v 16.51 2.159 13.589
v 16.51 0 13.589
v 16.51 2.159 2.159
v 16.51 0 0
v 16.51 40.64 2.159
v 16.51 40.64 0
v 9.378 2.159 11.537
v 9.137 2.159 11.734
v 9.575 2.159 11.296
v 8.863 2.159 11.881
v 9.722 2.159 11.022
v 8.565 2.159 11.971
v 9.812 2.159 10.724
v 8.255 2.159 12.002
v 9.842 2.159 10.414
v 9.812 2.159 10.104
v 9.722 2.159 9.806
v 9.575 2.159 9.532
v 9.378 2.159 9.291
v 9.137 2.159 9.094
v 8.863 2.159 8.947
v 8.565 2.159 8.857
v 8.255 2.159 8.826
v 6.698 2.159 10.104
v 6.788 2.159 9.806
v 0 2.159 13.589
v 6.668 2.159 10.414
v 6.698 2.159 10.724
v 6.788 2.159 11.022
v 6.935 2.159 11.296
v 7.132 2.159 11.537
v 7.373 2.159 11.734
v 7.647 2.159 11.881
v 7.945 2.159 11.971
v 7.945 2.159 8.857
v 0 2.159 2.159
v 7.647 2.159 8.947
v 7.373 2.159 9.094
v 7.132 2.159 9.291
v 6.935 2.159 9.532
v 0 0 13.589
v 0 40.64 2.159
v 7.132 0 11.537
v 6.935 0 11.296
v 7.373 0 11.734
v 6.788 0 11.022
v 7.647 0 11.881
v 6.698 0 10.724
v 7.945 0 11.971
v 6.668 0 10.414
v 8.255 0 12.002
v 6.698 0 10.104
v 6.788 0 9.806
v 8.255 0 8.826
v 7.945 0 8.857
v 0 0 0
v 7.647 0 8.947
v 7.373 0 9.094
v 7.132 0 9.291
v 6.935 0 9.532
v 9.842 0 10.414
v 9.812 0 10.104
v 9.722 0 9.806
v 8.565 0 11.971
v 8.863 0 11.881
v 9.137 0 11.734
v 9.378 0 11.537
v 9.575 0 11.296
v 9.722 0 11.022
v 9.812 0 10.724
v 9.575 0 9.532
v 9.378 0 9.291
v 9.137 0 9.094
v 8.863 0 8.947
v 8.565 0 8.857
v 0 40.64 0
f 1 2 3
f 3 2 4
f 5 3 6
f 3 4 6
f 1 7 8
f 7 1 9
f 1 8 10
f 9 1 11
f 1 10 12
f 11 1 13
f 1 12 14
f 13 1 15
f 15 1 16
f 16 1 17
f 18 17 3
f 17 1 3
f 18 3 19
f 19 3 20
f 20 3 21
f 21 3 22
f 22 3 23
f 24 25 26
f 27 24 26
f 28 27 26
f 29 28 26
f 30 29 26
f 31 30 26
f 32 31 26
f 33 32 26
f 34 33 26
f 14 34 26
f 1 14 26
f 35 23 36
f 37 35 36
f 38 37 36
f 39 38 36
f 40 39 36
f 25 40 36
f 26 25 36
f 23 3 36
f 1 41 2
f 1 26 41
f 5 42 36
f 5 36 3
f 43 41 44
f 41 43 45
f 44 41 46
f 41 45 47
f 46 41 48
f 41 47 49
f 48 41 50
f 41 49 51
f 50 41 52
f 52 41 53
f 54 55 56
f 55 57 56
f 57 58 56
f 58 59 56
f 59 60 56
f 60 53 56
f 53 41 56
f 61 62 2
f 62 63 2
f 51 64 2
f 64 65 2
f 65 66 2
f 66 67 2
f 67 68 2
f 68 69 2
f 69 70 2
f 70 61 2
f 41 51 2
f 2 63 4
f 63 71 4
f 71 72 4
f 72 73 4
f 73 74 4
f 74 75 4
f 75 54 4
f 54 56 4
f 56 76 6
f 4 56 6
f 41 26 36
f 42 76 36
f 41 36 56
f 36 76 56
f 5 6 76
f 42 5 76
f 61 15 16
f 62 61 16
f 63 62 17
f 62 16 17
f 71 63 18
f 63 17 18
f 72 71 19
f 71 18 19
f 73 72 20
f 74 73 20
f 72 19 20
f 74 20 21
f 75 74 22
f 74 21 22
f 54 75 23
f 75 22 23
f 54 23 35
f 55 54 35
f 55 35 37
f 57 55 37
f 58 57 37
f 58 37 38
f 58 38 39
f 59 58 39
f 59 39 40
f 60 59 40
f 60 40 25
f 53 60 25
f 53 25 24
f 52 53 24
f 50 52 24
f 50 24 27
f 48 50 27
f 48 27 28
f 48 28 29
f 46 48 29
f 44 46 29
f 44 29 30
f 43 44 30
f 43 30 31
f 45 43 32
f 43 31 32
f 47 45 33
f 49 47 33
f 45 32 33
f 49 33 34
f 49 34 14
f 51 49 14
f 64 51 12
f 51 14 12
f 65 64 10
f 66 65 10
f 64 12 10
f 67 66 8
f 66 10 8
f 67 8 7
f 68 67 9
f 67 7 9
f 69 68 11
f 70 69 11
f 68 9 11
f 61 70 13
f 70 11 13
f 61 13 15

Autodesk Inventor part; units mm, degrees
ref_plane "YZ Plane" through (0, 0, 0) normal (1, 0, 0) x (0, 1, 0)
ref_plane "XZ Plane" through (0, 0, 0) normal (0, 1, 0) x (-1, 0, 0)
ref_plane "XY Plane" through (0, 0, 0) normal (0, 0, 1) x (1, 0, 0)
sketch "Sketch1" plane through (0, 0, 0) normal (0, 0, 1) x (1, 0, 0)
  line L0 (0, 0) -> (16.51, 0)
  line L1 (16.51, 0) -> (16.51, 40.64)
  line L2 (16.51, 40.64) -> (0, 40.64)
  line L3 (0, 40.64) -> (0, 0)
  dimension "d0" = 40.64
  dimension "d1" = 16.51
extrude "Extrusion1" add sketch "Sketch1" along normal blind 2.159
sketch "Sketch2" plane through (0, 0, 2.159) normal (0, 0, 1) x (1, 0, 0)
  line L0 (0, 0) -> (16.51, 0) projected
  line L1 (16.51, 0) -> (16.51, 40.64) projected
  line L2 (0, 0) -> (16.51, 0)
  line L3 (16.51, 0) -> (16.51, 2.159)
  line L4 (16.51, 2.159) -> (0, 2.159)
  line L5 (0, 2.159) -> (0, 0)
  dimension "d4" = 2.159
extrude "Extrusion2" add sketch "Sketch2" along normal blind 11.43
sketch "Sketch3" plane through (0, 2.159, 2.159) normal (0, 1, 0) x (1, 0, 0)
  circle A0 centre (8.255, -8.255) radius 1.5875
  line L0 (16.51, -11.43) -> (0, -11.43) projected
  point P0 (0, 2.159)
  dimension "d8" = 3.175
  dimension "d12" = 3.175
extrude "Extrusion3" cut sketch "Sketch3" against normal blind 11.43
properties part number "L Bracket" material "Steel, Galvanized"
